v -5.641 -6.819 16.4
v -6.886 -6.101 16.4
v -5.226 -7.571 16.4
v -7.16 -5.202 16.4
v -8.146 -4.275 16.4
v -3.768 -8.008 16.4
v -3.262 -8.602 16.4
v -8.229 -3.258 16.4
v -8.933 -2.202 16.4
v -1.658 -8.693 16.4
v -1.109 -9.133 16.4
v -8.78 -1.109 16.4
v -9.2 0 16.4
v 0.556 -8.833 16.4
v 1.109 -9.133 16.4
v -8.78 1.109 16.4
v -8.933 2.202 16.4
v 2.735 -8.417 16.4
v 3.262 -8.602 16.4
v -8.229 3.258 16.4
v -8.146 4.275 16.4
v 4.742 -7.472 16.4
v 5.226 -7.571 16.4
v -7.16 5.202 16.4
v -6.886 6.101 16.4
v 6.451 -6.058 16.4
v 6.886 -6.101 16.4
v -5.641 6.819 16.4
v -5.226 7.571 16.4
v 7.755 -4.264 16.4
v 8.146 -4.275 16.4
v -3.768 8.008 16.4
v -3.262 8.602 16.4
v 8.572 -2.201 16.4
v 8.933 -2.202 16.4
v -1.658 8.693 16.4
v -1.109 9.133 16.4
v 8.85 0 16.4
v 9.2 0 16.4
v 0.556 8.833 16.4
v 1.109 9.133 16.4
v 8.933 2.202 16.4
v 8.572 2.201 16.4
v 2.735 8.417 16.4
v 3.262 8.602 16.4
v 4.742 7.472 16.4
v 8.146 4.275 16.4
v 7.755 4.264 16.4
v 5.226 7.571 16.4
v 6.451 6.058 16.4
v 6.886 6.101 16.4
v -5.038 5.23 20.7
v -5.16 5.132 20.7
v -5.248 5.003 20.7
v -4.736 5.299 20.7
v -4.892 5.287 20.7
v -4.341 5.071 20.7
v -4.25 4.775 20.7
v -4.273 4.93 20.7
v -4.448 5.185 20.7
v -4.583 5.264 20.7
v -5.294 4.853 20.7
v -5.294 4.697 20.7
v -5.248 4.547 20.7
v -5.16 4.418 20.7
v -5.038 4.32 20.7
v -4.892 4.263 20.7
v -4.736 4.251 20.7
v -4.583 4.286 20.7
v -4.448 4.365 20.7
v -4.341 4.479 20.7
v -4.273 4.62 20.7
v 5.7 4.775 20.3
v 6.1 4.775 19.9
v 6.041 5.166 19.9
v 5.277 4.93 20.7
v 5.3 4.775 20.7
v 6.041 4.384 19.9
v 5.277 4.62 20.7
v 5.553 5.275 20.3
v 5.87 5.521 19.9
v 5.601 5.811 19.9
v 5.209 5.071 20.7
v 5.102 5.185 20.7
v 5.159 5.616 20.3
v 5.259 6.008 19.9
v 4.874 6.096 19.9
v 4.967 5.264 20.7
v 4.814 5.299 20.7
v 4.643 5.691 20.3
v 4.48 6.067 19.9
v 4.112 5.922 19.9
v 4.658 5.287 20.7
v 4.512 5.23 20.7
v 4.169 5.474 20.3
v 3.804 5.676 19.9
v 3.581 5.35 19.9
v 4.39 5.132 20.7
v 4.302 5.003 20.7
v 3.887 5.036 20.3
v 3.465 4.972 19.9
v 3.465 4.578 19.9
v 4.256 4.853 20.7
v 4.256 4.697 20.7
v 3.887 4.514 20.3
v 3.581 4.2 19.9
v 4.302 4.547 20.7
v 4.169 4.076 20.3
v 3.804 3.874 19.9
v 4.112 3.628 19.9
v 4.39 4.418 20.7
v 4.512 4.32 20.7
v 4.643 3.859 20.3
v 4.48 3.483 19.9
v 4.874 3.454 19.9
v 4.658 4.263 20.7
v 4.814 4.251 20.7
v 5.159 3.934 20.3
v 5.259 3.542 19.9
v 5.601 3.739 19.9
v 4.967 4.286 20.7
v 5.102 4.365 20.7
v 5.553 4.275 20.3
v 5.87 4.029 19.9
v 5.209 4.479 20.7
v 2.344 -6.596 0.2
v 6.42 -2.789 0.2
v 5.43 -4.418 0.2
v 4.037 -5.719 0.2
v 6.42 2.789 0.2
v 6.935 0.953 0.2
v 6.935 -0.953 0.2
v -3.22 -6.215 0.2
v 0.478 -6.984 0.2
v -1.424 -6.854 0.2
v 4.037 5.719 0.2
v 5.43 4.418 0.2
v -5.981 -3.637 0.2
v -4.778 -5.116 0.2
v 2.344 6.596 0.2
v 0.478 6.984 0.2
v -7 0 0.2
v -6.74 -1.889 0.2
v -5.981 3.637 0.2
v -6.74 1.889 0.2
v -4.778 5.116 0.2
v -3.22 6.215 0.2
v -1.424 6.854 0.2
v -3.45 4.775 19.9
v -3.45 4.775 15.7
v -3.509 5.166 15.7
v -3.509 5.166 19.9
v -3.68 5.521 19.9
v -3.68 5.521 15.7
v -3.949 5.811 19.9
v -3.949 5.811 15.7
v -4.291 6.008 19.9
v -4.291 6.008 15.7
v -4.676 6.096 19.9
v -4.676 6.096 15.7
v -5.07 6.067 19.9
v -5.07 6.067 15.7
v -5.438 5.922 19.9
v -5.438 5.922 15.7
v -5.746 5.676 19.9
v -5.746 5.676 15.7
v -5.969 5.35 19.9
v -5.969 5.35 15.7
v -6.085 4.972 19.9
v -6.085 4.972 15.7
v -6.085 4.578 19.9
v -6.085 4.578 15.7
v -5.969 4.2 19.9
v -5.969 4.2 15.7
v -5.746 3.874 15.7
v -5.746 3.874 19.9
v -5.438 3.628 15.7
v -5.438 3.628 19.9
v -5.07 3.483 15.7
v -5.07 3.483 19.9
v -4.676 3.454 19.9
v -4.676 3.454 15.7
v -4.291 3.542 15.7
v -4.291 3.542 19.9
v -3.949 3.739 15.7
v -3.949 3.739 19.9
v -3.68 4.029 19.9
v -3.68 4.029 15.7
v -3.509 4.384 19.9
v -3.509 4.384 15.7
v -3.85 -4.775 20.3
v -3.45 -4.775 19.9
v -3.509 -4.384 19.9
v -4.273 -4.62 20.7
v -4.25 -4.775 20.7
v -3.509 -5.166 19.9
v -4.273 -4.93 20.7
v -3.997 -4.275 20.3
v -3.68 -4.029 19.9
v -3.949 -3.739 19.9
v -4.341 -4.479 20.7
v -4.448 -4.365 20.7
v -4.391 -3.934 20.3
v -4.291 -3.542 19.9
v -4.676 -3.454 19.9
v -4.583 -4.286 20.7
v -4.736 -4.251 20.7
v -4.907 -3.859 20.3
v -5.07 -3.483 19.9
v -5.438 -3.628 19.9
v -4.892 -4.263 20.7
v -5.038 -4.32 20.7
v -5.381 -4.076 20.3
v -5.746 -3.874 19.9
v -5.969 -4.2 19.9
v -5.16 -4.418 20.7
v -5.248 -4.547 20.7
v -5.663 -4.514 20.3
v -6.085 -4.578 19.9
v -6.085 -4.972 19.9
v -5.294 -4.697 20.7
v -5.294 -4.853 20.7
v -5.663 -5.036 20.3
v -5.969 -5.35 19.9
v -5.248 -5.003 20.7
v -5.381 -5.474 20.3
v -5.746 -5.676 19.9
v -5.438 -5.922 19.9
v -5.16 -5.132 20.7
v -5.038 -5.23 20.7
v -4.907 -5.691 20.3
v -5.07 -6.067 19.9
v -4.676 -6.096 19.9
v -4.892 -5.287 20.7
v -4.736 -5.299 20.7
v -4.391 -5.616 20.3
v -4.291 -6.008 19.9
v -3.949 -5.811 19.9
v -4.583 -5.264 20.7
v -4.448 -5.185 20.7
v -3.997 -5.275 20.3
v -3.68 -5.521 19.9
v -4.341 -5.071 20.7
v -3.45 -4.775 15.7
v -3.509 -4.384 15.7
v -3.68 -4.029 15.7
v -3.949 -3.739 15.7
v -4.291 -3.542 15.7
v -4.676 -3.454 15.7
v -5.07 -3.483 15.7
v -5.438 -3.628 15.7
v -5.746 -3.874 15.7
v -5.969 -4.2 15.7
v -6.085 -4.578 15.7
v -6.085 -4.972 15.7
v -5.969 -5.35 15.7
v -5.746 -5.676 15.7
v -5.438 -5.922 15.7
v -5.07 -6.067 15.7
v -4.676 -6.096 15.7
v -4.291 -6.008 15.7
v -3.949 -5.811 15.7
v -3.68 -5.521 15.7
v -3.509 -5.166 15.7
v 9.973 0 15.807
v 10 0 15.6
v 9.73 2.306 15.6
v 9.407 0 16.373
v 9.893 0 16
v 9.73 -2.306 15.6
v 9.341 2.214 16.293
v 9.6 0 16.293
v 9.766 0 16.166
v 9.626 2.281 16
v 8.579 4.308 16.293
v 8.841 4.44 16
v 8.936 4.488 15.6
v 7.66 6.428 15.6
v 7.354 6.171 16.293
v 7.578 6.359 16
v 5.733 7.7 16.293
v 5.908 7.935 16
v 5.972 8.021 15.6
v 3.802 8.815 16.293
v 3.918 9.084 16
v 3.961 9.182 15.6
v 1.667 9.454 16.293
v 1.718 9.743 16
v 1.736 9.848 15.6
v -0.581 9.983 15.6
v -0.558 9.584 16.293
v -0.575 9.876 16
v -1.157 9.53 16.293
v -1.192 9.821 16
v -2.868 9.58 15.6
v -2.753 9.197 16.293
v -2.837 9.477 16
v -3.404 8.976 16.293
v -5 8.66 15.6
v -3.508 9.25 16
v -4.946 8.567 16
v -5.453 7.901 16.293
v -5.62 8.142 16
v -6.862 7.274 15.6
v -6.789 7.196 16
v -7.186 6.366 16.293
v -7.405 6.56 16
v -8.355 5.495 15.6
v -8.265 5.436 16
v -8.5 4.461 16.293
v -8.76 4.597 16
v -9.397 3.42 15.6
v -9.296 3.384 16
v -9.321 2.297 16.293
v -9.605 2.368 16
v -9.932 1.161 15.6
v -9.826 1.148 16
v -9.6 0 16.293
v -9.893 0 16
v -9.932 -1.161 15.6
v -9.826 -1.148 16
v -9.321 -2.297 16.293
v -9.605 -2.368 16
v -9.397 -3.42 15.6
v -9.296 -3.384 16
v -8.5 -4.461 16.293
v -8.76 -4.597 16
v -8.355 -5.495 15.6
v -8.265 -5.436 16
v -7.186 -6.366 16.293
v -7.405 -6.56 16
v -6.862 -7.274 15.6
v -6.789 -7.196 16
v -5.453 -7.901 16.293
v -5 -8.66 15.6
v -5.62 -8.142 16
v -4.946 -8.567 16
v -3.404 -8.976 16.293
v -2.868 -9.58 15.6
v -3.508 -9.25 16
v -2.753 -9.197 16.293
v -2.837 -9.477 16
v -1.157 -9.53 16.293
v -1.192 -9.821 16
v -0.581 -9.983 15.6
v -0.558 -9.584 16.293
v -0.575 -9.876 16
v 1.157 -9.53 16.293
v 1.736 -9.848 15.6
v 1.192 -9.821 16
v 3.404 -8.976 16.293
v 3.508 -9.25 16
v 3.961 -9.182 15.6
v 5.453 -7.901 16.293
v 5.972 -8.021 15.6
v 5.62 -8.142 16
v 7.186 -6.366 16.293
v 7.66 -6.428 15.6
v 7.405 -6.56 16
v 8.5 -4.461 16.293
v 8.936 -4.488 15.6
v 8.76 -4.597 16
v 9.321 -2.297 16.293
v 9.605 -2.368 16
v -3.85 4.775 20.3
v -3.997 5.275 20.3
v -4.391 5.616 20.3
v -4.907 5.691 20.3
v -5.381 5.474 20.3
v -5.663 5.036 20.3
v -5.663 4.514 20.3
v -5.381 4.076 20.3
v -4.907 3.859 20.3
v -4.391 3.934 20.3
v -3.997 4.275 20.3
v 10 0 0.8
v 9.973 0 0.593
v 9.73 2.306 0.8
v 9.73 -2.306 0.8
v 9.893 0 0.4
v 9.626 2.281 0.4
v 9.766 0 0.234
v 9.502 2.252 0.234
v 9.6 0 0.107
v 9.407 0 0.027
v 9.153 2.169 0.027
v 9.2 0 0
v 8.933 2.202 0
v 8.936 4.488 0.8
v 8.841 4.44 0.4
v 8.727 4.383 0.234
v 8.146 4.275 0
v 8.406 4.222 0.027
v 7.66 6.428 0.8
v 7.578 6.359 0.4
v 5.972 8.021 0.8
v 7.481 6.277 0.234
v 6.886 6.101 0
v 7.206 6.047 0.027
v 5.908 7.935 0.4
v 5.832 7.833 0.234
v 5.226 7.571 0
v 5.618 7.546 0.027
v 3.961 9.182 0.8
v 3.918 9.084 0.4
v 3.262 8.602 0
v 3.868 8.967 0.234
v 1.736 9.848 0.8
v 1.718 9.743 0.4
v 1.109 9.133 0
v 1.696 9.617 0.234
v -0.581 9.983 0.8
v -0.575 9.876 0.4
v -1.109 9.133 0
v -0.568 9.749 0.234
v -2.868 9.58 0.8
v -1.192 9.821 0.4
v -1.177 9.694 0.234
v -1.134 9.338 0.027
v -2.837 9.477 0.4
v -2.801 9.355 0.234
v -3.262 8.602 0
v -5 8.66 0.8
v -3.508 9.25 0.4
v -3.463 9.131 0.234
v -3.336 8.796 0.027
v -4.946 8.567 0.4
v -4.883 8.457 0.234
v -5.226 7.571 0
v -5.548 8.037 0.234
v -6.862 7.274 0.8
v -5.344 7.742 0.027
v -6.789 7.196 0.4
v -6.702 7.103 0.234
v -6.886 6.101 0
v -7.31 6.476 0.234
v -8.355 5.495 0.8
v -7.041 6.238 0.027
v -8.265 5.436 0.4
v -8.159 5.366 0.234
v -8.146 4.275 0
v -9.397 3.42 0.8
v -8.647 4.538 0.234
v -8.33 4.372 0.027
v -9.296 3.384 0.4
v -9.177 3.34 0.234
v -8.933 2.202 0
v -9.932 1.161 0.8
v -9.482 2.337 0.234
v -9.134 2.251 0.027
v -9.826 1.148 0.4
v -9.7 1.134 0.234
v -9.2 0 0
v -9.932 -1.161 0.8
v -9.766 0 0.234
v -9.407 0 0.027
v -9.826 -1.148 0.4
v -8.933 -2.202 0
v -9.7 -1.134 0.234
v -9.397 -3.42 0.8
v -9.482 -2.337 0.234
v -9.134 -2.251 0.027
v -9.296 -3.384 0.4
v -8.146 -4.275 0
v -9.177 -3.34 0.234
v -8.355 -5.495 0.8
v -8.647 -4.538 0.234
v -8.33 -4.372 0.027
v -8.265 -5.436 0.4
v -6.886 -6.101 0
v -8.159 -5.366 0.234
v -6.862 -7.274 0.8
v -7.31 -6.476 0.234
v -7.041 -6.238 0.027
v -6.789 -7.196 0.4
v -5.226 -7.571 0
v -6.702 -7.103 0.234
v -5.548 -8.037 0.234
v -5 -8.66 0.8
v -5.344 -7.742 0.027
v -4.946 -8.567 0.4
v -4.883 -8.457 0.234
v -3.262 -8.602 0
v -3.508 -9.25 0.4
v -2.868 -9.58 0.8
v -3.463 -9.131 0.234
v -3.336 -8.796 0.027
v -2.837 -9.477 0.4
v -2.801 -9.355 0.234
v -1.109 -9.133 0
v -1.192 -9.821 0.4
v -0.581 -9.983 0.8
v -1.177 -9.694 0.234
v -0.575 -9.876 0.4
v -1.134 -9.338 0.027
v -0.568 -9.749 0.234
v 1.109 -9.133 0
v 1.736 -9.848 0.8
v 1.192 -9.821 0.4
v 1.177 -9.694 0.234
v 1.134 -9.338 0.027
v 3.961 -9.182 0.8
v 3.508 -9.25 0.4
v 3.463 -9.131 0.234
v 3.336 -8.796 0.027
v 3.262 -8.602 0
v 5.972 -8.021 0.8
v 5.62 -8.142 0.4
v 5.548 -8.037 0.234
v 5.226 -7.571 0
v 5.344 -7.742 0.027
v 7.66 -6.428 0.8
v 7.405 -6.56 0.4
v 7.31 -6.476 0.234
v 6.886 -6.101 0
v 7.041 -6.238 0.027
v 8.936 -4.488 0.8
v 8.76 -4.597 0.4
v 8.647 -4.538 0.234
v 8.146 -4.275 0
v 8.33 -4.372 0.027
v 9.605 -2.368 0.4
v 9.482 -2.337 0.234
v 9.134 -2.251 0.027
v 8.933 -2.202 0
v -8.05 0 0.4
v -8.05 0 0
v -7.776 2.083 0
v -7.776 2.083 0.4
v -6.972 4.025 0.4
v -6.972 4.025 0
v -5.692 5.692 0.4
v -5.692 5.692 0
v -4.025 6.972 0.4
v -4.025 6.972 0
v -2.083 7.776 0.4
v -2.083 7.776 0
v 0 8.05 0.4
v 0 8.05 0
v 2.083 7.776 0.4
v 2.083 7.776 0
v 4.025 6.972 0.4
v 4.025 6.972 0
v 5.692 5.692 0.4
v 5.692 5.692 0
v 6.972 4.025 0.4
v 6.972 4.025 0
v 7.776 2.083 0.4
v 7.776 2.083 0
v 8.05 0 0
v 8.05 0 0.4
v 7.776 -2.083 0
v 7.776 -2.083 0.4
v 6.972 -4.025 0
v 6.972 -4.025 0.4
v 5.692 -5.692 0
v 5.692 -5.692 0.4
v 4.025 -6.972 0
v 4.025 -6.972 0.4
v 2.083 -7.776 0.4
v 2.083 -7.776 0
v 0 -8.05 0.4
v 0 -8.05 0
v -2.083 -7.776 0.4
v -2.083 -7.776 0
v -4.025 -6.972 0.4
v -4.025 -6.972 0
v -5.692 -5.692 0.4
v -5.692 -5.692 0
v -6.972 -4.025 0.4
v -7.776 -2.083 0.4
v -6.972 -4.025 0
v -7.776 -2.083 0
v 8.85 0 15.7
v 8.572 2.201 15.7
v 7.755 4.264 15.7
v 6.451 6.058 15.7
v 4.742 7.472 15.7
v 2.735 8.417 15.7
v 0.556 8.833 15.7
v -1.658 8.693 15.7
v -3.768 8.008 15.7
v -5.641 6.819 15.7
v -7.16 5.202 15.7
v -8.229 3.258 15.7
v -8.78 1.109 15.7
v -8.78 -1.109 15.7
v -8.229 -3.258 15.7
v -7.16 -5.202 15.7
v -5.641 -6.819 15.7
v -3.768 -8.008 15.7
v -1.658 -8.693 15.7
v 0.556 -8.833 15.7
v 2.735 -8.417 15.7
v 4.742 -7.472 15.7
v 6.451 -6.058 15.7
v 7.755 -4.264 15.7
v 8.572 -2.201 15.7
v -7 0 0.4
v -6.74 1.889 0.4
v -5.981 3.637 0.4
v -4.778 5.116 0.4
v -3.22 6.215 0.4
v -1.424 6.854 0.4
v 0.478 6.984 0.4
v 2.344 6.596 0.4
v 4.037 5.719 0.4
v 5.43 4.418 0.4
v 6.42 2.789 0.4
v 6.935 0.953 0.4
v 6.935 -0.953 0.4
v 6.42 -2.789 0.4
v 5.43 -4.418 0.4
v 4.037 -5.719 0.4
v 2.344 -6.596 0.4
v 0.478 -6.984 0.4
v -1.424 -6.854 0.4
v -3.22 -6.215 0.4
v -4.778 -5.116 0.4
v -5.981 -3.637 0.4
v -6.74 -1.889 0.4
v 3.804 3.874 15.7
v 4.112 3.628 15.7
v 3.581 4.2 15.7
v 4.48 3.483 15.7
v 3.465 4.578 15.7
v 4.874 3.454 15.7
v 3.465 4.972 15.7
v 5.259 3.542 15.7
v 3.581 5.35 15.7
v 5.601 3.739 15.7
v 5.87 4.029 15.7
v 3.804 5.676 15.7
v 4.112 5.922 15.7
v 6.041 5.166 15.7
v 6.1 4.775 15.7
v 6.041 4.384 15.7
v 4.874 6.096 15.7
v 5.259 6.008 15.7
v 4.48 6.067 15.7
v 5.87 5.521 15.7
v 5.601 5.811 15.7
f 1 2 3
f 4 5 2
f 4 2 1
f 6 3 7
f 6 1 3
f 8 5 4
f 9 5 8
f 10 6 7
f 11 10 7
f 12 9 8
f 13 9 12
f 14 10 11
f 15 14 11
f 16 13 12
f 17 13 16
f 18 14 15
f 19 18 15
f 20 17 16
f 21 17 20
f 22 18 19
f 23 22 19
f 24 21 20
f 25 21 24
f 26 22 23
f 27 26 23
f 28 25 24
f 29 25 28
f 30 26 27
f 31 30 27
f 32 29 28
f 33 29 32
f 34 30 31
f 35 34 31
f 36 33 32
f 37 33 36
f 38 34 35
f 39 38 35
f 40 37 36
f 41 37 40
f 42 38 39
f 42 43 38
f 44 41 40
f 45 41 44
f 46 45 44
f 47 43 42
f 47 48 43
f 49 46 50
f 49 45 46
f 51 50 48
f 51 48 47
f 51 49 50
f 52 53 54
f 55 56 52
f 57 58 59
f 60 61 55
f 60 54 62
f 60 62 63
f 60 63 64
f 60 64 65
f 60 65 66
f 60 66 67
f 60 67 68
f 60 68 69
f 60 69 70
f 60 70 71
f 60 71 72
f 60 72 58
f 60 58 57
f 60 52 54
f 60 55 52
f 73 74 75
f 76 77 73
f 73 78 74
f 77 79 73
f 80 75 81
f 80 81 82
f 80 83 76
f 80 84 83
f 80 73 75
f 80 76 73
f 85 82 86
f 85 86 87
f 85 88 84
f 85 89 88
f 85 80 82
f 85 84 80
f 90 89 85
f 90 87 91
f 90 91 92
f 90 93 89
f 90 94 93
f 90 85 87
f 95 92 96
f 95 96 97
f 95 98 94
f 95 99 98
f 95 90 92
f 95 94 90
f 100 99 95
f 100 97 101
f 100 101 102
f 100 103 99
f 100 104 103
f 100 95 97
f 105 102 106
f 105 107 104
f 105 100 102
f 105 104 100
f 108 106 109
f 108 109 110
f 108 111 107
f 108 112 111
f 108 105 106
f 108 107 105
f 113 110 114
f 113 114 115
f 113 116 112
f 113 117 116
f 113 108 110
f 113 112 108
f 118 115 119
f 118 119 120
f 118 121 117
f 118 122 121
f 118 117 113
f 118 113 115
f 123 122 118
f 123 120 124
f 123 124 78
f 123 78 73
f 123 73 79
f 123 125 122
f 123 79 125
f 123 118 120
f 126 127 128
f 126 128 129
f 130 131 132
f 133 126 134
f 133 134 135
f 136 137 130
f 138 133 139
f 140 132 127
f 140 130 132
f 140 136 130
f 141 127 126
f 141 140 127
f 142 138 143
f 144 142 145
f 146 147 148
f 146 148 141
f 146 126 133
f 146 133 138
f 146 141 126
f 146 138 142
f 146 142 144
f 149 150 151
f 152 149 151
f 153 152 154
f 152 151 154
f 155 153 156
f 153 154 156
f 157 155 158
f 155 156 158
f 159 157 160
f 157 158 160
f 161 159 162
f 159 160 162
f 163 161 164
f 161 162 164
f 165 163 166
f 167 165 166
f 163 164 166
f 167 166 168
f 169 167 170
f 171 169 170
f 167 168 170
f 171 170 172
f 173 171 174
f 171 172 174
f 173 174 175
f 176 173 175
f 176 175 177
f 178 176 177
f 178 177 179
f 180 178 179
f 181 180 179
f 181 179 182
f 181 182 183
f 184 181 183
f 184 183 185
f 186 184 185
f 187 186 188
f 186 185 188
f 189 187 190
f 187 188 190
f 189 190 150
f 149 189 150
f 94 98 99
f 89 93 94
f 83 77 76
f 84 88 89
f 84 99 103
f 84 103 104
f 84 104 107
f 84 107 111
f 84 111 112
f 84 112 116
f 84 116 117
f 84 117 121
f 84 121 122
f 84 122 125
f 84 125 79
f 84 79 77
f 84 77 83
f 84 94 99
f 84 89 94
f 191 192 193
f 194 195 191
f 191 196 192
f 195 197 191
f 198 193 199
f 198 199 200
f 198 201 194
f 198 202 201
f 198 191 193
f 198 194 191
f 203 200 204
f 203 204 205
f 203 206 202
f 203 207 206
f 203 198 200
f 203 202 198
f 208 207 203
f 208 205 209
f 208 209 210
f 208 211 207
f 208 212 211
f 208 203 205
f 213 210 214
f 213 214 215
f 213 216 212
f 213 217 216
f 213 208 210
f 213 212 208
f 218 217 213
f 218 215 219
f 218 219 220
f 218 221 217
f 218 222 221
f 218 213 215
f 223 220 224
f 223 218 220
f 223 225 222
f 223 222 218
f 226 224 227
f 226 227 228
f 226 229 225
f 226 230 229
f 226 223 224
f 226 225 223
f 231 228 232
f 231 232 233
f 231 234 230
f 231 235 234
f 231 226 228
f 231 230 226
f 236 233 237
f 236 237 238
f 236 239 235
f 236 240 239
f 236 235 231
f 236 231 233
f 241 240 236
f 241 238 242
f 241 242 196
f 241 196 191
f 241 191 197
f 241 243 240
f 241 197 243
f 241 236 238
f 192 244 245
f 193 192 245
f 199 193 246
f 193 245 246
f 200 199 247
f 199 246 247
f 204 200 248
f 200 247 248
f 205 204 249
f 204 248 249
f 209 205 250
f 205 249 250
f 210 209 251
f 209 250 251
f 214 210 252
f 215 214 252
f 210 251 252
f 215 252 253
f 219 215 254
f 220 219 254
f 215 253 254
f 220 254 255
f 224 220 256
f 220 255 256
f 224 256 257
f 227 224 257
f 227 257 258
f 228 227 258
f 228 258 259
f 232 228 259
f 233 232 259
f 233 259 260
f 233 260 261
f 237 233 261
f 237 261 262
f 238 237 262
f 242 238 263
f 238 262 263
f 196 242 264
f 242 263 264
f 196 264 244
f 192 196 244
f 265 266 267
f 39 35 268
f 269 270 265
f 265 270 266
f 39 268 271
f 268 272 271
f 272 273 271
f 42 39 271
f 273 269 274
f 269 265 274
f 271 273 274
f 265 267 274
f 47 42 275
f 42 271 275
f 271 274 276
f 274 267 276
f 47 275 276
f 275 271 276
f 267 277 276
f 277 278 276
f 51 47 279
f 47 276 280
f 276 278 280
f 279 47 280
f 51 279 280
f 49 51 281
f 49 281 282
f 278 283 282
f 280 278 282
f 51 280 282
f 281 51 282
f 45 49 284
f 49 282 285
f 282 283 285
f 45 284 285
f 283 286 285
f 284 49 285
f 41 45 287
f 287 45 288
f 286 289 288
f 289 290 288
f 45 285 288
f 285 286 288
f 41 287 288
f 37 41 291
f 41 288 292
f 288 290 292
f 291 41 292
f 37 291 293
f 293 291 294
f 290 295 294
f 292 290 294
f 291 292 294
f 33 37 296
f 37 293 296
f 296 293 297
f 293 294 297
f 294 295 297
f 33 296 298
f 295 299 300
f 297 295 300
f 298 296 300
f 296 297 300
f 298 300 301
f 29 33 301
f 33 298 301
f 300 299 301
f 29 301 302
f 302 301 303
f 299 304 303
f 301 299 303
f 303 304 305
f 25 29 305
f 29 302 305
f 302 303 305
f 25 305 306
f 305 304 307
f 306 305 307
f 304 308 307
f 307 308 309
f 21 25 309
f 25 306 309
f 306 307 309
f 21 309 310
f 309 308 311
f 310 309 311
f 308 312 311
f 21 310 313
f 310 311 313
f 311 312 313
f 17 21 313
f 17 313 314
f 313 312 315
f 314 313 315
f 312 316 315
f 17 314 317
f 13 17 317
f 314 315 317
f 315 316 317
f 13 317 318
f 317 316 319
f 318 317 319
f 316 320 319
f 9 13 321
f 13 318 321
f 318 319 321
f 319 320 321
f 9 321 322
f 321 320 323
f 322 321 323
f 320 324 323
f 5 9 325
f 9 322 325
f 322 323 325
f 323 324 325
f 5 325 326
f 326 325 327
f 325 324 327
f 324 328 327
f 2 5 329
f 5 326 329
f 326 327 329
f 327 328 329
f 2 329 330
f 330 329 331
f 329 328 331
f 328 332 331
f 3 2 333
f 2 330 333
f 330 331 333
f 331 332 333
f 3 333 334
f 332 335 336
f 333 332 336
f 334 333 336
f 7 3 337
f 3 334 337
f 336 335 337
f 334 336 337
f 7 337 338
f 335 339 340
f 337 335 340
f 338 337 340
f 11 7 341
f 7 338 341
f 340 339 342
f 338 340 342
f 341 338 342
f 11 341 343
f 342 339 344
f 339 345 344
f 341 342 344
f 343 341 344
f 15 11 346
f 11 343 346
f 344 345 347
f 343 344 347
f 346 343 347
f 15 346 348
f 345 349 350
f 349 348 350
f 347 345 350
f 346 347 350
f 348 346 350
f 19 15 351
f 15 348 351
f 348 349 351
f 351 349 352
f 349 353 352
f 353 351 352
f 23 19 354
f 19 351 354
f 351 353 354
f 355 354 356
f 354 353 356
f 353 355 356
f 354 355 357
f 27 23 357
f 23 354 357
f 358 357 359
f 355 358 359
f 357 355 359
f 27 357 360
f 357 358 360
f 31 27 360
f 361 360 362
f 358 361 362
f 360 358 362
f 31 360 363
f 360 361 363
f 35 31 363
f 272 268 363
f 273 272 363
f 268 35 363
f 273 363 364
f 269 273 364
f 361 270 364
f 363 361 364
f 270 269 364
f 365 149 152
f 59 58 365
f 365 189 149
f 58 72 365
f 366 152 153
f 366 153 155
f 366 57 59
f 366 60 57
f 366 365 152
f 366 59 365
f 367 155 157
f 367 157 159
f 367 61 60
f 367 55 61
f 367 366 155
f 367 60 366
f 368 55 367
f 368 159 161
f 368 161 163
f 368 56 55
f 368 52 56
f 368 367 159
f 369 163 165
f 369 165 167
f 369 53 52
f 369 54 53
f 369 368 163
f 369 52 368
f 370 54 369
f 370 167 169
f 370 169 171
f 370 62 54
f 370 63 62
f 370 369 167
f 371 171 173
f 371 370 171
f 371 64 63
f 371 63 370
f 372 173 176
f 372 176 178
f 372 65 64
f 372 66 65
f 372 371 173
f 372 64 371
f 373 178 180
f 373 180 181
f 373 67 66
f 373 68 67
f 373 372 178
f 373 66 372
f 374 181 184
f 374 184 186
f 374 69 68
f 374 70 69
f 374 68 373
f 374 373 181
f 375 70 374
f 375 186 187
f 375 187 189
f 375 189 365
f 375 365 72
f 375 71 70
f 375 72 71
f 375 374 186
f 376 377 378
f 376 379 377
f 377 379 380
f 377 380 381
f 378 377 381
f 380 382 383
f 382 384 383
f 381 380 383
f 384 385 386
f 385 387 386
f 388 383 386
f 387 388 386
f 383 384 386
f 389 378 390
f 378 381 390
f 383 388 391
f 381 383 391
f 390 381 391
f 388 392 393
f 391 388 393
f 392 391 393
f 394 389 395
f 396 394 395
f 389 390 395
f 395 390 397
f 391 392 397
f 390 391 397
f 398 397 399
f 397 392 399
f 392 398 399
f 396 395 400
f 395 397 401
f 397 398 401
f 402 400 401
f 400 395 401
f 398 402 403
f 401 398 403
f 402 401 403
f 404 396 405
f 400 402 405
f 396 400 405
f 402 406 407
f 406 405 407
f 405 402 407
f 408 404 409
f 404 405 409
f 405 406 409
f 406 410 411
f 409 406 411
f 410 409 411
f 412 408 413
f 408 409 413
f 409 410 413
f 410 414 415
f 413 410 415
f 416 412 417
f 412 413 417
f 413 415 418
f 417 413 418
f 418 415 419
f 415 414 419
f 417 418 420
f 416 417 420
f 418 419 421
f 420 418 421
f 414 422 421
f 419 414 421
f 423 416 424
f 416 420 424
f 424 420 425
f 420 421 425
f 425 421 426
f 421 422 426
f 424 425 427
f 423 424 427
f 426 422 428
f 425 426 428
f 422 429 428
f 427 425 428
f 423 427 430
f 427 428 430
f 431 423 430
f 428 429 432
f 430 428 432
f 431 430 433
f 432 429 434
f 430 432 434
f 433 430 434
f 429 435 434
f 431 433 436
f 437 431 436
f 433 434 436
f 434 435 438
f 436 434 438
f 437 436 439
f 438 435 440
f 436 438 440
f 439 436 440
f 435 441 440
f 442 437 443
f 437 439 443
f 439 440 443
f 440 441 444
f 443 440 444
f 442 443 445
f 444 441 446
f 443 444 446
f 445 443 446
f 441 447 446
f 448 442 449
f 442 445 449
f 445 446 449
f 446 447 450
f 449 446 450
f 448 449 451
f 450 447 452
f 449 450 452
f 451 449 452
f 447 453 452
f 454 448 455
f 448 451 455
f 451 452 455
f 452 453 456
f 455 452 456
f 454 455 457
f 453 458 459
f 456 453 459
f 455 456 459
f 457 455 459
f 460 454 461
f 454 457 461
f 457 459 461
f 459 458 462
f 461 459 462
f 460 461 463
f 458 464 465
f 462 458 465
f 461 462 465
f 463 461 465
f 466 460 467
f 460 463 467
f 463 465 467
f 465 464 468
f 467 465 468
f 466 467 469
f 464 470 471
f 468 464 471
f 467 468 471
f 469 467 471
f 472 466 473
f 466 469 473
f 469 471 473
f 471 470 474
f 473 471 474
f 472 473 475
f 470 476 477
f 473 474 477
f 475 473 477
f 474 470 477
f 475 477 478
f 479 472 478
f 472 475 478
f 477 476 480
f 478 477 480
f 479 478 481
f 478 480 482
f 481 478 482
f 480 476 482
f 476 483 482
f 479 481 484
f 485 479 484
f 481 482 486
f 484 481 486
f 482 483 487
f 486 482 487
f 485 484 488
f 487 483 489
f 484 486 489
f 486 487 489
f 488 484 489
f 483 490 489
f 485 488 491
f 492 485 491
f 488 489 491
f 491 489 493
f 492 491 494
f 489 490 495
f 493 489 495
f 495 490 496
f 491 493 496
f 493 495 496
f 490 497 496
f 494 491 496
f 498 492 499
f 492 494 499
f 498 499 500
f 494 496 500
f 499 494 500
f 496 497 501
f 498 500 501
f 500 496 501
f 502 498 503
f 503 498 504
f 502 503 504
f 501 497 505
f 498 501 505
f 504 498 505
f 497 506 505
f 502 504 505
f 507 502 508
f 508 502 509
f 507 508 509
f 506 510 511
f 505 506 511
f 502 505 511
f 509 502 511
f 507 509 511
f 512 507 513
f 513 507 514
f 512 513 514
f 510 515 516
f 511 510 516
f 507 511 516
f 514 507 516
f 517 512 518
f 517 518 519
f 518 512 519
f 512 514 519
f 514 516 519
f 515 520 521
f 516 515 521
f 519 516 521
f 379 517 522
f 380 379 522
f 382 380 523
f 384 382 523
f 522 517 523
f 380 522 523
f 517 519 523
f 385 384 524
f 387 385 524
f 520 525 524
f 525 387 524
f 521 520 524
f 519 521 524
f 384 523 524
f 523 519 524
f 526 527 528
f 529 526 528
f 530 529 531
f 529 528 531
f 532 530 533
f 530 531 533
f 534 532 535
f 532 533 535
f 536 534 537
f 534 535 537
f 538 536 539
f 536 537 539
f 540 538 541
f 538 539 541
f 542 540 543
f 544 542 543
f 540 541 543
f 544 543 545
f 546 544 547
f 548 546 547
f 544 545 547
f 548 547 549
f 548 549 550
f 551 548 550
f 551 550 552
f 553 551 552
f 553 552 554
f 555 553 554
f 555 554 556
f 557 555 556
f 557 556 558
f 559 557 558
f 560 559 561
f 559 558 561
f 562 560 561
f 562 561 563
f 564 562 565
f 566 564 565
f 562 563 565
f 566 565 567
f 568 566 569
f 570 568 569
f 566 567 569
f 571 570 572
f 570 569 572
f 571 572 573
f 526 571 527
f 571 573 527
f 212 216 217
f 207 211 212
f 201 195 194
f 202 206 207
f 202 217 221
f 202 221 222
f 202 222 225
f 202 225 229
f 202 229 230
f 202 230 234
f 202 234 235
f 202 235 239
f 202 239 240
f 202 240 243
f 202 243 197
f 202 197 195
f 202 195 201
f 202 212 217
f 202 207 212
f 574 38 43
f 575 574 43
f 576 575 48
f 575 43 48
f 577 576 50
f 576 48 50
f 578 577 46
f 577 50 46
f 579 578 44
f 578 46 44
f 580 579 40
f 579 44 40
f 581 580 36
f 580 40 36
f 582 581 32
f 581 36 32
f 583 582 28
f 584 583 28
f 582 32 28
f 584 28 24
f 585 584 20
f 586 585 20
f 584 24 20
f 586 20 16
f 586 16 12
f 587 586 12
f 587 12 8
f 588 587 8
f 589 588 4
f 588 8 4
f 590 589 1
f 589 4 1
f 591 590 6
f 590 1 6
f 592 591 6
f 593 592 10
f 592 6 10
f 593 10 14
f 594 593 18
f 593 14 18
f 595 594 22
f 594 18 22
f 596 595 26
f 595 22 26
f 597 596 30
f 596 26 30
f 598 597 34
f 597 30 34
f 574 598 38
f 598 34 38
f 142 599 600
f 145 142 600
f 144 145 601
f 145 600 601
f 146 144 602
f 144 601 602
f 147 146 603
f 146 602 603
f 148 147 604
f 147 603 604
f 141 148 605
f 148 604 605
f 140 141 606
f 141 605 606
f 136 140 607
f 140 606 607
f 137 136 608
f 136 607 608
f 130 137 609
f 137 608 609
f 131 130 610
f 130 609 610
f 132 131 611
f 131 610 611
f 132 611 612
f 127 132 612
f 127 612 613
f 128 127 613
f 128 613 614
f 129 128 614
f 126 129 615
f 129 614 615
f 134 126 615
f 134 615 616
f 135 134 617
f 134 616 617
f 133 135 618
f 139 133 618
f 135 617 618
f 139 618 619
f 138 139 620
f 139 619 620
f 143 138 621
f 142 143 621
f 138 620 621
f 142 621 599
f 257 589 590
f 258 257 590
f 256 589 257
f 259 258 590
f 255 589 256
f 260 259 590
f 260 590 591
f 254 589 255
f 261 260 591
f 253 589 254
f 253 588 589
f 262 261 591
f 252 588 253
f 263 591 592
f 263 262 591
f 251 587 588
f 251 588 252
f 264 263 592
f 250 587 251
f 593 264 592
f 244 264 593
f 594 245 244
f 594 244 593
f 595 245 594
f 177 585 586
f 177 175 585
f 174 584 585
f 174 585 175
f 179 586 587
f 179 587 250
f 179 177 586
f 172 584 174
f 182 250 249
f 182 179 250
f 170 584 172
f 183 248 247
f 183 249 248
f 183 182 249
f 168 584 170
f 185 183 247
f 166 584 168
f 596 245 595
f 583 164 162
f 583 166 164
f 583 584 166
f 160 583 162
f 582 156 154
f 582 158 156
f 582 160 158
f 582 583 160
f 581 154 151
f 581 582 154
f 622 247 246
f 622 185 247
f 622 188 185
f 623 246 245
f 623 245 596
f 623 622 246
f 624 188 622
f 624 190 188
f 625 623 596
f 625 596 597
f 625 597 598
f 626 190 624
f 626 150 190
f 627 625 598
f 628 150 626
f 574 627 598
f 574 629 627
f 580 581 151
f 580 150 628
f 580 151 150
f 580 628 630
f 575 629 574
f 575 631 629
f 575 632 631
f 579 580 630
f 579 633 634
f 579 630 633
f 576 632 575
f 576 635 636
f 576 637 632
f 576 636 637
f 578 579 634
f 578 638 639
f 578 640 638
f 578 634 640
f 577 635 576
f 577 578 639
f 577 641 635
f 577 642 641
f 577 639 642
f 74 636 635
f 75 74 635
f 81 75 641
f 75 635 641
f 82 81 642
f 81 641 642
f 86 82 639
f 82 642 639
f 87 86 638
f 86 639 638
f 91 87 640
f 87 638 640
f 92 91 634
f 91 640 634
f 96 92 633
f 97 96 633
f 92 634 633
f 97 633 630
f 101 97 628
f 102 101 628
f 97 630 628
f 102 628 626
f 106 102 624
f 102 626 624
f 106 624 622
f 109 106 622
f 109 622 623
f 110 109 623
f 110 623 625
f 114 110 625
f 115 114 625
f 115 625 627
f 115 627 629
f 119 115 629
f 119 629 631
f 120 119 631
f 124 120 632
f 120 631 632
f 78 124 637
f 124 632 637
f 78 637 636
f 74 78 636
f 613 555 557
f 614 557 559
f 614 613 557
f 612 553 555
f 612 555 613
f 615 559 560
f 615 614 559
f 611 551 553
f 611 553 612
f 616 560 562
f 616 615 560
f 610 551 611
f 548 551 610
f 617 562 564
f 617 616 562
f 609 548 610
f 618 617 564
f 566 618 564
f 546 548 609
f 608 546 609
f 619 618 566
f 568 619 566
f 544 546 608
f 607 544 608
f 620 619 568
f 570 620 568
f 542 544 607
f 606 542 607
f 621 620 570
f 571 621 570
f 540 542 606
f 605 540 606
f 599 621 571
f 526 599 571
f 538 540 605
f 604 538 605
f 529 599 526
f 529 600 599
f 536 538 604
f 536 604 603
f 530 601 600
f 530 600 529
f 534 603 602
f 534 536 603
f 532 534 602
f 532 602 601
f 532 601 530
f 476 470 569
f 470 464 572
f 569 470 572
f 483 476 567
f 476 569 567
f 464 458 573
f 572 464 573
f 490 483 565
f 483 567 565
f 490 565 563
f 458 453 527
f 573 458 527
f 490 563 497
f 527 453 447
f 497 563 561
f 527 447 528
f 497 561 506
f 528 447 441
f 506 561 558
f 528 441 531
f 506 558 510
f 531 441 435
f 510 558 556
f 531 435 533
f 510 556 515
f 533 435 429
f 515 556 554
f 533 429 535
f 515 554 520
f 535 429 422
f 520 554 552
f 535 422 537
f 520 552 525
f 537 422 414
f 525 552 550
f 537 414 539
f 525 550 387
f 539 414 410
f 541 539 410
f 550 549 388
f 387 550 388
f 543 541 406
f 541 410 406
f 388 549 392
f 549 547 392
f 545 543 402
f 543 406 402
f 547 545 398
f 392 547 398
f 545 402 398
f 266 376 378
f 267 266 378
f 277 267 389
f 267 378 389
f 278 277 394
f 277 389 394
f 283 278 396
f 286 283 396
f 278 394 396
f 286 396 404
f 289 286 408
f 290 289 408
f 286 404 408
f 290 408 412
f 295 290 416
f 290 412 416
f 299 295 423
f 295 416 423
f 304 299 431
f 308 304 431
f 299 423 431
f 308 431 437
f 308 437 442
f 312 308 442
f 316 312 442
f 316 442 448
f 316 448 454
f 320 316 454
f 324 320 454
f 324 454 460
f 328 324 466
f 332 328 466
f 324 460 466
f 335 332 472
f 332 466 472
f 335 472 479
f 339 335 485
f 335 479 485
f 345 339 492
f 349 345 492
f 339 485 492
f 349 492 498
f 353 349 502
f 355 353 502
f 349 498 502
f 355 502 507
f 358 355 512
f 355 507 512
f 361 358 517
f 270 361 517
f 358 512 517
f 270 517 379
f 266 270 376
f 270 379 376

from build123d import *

# Parameters (mm, degrees)
SKETCH_1_R          = 10
EXTRUDE_1_DEPTH     = 16.4
SKETCH_2_R          = 8.85
CUT_EXTRUDE_1_DEPTH = 0.7
SKETCH_3_R          = 1.325
EXTRUDE_2_DEPTH     = 5
CHAMFER_1_SIZE      = 0.8
SKETCH_4_R          = 8.05
CUT_EXTRUDE_2_DEPTH = 0.4
FILLET_1_R          = 0.8
SKETCH_5_R          = 7
EXTRUDE_3_DEPTH     = 0.2


with BuildPart() as part:
    # Эскиз1 → Бобышка-Вытянуть1 (new body)
    with BuildSketch(Plane.XY):
        Circle(SKETCH_1_R)
    extrude(amount=EXTRUDE_1_DEPTH)

    # Эскиз2 → Вырез-Вытянуть1 (cut)
    with BuildSketch(Plane.XY.offset(16.4)):
        Circle(SKETCH_2_R)
    extrude(amount=-CUT_EXTRUDE_1_DEPTH, mode=Mode.SUBTRACT)

    # Эскиз3 → Бобышка-Вытянуть2 (add)
    with BuildSketch(Plane.XY.offset(15.7)):
        with Locations((-4.775, 4.775)):
            Circle(SKETCH_3_R)
        with Locations((-4.775, -4.775)):
            Circle(SKETCH_3_R)
        with Locations((4.775, 4.775)):
            Circle(SKETCH_3_R)
    extrude(amount=EXTRUDE_2_DEPTH)

    # Фаска1
    chamfer_1_edges = [part.edges().sort_by_distance(p)[0] for p in [
        (-6.1, 4.775, 20.7),
        (-6.1, -4.775, 20.7),
        (3.45, 4.775, 20.7),
    ]]
    chamfer(chamfer_1_edges, length=CHAMFER_1_SIZE)

    # Эскиз4 → Вырез-Вытянуть2 (cut)
    with BuildSketch(Plane(origin=(0, 0, 0), x_dir=(-1, 0, 0), z_dir=(0, 0, -1))):
        Circle(SKETCH_4_R)
    extrude(amount=-CUT_EXTRUDE_2_DEPTH, mode=Mode.SUBTRACT)

    # Скругление1
    fillet_1_edges = [part.edges().sort_by_distance(p)[0] for p in [
        (-10, 0, 0),
        (-10, 0, 16.4),
    ]]
    fillet(fillet_1_edges, radius=FILLET_1_R)

    # Эскиз5 → Бобышка-Вытянуть3 (add)
    with BuildSketch(Plane(origin=(0, 0, 0.4), x_dir=(-1, 0, 0), z_dir=(0, 0, -1))):
        Circle(SKETCH_5_R)
    extrude(amount=EXTRUDE_3_DEPTH)


solid = part.part
